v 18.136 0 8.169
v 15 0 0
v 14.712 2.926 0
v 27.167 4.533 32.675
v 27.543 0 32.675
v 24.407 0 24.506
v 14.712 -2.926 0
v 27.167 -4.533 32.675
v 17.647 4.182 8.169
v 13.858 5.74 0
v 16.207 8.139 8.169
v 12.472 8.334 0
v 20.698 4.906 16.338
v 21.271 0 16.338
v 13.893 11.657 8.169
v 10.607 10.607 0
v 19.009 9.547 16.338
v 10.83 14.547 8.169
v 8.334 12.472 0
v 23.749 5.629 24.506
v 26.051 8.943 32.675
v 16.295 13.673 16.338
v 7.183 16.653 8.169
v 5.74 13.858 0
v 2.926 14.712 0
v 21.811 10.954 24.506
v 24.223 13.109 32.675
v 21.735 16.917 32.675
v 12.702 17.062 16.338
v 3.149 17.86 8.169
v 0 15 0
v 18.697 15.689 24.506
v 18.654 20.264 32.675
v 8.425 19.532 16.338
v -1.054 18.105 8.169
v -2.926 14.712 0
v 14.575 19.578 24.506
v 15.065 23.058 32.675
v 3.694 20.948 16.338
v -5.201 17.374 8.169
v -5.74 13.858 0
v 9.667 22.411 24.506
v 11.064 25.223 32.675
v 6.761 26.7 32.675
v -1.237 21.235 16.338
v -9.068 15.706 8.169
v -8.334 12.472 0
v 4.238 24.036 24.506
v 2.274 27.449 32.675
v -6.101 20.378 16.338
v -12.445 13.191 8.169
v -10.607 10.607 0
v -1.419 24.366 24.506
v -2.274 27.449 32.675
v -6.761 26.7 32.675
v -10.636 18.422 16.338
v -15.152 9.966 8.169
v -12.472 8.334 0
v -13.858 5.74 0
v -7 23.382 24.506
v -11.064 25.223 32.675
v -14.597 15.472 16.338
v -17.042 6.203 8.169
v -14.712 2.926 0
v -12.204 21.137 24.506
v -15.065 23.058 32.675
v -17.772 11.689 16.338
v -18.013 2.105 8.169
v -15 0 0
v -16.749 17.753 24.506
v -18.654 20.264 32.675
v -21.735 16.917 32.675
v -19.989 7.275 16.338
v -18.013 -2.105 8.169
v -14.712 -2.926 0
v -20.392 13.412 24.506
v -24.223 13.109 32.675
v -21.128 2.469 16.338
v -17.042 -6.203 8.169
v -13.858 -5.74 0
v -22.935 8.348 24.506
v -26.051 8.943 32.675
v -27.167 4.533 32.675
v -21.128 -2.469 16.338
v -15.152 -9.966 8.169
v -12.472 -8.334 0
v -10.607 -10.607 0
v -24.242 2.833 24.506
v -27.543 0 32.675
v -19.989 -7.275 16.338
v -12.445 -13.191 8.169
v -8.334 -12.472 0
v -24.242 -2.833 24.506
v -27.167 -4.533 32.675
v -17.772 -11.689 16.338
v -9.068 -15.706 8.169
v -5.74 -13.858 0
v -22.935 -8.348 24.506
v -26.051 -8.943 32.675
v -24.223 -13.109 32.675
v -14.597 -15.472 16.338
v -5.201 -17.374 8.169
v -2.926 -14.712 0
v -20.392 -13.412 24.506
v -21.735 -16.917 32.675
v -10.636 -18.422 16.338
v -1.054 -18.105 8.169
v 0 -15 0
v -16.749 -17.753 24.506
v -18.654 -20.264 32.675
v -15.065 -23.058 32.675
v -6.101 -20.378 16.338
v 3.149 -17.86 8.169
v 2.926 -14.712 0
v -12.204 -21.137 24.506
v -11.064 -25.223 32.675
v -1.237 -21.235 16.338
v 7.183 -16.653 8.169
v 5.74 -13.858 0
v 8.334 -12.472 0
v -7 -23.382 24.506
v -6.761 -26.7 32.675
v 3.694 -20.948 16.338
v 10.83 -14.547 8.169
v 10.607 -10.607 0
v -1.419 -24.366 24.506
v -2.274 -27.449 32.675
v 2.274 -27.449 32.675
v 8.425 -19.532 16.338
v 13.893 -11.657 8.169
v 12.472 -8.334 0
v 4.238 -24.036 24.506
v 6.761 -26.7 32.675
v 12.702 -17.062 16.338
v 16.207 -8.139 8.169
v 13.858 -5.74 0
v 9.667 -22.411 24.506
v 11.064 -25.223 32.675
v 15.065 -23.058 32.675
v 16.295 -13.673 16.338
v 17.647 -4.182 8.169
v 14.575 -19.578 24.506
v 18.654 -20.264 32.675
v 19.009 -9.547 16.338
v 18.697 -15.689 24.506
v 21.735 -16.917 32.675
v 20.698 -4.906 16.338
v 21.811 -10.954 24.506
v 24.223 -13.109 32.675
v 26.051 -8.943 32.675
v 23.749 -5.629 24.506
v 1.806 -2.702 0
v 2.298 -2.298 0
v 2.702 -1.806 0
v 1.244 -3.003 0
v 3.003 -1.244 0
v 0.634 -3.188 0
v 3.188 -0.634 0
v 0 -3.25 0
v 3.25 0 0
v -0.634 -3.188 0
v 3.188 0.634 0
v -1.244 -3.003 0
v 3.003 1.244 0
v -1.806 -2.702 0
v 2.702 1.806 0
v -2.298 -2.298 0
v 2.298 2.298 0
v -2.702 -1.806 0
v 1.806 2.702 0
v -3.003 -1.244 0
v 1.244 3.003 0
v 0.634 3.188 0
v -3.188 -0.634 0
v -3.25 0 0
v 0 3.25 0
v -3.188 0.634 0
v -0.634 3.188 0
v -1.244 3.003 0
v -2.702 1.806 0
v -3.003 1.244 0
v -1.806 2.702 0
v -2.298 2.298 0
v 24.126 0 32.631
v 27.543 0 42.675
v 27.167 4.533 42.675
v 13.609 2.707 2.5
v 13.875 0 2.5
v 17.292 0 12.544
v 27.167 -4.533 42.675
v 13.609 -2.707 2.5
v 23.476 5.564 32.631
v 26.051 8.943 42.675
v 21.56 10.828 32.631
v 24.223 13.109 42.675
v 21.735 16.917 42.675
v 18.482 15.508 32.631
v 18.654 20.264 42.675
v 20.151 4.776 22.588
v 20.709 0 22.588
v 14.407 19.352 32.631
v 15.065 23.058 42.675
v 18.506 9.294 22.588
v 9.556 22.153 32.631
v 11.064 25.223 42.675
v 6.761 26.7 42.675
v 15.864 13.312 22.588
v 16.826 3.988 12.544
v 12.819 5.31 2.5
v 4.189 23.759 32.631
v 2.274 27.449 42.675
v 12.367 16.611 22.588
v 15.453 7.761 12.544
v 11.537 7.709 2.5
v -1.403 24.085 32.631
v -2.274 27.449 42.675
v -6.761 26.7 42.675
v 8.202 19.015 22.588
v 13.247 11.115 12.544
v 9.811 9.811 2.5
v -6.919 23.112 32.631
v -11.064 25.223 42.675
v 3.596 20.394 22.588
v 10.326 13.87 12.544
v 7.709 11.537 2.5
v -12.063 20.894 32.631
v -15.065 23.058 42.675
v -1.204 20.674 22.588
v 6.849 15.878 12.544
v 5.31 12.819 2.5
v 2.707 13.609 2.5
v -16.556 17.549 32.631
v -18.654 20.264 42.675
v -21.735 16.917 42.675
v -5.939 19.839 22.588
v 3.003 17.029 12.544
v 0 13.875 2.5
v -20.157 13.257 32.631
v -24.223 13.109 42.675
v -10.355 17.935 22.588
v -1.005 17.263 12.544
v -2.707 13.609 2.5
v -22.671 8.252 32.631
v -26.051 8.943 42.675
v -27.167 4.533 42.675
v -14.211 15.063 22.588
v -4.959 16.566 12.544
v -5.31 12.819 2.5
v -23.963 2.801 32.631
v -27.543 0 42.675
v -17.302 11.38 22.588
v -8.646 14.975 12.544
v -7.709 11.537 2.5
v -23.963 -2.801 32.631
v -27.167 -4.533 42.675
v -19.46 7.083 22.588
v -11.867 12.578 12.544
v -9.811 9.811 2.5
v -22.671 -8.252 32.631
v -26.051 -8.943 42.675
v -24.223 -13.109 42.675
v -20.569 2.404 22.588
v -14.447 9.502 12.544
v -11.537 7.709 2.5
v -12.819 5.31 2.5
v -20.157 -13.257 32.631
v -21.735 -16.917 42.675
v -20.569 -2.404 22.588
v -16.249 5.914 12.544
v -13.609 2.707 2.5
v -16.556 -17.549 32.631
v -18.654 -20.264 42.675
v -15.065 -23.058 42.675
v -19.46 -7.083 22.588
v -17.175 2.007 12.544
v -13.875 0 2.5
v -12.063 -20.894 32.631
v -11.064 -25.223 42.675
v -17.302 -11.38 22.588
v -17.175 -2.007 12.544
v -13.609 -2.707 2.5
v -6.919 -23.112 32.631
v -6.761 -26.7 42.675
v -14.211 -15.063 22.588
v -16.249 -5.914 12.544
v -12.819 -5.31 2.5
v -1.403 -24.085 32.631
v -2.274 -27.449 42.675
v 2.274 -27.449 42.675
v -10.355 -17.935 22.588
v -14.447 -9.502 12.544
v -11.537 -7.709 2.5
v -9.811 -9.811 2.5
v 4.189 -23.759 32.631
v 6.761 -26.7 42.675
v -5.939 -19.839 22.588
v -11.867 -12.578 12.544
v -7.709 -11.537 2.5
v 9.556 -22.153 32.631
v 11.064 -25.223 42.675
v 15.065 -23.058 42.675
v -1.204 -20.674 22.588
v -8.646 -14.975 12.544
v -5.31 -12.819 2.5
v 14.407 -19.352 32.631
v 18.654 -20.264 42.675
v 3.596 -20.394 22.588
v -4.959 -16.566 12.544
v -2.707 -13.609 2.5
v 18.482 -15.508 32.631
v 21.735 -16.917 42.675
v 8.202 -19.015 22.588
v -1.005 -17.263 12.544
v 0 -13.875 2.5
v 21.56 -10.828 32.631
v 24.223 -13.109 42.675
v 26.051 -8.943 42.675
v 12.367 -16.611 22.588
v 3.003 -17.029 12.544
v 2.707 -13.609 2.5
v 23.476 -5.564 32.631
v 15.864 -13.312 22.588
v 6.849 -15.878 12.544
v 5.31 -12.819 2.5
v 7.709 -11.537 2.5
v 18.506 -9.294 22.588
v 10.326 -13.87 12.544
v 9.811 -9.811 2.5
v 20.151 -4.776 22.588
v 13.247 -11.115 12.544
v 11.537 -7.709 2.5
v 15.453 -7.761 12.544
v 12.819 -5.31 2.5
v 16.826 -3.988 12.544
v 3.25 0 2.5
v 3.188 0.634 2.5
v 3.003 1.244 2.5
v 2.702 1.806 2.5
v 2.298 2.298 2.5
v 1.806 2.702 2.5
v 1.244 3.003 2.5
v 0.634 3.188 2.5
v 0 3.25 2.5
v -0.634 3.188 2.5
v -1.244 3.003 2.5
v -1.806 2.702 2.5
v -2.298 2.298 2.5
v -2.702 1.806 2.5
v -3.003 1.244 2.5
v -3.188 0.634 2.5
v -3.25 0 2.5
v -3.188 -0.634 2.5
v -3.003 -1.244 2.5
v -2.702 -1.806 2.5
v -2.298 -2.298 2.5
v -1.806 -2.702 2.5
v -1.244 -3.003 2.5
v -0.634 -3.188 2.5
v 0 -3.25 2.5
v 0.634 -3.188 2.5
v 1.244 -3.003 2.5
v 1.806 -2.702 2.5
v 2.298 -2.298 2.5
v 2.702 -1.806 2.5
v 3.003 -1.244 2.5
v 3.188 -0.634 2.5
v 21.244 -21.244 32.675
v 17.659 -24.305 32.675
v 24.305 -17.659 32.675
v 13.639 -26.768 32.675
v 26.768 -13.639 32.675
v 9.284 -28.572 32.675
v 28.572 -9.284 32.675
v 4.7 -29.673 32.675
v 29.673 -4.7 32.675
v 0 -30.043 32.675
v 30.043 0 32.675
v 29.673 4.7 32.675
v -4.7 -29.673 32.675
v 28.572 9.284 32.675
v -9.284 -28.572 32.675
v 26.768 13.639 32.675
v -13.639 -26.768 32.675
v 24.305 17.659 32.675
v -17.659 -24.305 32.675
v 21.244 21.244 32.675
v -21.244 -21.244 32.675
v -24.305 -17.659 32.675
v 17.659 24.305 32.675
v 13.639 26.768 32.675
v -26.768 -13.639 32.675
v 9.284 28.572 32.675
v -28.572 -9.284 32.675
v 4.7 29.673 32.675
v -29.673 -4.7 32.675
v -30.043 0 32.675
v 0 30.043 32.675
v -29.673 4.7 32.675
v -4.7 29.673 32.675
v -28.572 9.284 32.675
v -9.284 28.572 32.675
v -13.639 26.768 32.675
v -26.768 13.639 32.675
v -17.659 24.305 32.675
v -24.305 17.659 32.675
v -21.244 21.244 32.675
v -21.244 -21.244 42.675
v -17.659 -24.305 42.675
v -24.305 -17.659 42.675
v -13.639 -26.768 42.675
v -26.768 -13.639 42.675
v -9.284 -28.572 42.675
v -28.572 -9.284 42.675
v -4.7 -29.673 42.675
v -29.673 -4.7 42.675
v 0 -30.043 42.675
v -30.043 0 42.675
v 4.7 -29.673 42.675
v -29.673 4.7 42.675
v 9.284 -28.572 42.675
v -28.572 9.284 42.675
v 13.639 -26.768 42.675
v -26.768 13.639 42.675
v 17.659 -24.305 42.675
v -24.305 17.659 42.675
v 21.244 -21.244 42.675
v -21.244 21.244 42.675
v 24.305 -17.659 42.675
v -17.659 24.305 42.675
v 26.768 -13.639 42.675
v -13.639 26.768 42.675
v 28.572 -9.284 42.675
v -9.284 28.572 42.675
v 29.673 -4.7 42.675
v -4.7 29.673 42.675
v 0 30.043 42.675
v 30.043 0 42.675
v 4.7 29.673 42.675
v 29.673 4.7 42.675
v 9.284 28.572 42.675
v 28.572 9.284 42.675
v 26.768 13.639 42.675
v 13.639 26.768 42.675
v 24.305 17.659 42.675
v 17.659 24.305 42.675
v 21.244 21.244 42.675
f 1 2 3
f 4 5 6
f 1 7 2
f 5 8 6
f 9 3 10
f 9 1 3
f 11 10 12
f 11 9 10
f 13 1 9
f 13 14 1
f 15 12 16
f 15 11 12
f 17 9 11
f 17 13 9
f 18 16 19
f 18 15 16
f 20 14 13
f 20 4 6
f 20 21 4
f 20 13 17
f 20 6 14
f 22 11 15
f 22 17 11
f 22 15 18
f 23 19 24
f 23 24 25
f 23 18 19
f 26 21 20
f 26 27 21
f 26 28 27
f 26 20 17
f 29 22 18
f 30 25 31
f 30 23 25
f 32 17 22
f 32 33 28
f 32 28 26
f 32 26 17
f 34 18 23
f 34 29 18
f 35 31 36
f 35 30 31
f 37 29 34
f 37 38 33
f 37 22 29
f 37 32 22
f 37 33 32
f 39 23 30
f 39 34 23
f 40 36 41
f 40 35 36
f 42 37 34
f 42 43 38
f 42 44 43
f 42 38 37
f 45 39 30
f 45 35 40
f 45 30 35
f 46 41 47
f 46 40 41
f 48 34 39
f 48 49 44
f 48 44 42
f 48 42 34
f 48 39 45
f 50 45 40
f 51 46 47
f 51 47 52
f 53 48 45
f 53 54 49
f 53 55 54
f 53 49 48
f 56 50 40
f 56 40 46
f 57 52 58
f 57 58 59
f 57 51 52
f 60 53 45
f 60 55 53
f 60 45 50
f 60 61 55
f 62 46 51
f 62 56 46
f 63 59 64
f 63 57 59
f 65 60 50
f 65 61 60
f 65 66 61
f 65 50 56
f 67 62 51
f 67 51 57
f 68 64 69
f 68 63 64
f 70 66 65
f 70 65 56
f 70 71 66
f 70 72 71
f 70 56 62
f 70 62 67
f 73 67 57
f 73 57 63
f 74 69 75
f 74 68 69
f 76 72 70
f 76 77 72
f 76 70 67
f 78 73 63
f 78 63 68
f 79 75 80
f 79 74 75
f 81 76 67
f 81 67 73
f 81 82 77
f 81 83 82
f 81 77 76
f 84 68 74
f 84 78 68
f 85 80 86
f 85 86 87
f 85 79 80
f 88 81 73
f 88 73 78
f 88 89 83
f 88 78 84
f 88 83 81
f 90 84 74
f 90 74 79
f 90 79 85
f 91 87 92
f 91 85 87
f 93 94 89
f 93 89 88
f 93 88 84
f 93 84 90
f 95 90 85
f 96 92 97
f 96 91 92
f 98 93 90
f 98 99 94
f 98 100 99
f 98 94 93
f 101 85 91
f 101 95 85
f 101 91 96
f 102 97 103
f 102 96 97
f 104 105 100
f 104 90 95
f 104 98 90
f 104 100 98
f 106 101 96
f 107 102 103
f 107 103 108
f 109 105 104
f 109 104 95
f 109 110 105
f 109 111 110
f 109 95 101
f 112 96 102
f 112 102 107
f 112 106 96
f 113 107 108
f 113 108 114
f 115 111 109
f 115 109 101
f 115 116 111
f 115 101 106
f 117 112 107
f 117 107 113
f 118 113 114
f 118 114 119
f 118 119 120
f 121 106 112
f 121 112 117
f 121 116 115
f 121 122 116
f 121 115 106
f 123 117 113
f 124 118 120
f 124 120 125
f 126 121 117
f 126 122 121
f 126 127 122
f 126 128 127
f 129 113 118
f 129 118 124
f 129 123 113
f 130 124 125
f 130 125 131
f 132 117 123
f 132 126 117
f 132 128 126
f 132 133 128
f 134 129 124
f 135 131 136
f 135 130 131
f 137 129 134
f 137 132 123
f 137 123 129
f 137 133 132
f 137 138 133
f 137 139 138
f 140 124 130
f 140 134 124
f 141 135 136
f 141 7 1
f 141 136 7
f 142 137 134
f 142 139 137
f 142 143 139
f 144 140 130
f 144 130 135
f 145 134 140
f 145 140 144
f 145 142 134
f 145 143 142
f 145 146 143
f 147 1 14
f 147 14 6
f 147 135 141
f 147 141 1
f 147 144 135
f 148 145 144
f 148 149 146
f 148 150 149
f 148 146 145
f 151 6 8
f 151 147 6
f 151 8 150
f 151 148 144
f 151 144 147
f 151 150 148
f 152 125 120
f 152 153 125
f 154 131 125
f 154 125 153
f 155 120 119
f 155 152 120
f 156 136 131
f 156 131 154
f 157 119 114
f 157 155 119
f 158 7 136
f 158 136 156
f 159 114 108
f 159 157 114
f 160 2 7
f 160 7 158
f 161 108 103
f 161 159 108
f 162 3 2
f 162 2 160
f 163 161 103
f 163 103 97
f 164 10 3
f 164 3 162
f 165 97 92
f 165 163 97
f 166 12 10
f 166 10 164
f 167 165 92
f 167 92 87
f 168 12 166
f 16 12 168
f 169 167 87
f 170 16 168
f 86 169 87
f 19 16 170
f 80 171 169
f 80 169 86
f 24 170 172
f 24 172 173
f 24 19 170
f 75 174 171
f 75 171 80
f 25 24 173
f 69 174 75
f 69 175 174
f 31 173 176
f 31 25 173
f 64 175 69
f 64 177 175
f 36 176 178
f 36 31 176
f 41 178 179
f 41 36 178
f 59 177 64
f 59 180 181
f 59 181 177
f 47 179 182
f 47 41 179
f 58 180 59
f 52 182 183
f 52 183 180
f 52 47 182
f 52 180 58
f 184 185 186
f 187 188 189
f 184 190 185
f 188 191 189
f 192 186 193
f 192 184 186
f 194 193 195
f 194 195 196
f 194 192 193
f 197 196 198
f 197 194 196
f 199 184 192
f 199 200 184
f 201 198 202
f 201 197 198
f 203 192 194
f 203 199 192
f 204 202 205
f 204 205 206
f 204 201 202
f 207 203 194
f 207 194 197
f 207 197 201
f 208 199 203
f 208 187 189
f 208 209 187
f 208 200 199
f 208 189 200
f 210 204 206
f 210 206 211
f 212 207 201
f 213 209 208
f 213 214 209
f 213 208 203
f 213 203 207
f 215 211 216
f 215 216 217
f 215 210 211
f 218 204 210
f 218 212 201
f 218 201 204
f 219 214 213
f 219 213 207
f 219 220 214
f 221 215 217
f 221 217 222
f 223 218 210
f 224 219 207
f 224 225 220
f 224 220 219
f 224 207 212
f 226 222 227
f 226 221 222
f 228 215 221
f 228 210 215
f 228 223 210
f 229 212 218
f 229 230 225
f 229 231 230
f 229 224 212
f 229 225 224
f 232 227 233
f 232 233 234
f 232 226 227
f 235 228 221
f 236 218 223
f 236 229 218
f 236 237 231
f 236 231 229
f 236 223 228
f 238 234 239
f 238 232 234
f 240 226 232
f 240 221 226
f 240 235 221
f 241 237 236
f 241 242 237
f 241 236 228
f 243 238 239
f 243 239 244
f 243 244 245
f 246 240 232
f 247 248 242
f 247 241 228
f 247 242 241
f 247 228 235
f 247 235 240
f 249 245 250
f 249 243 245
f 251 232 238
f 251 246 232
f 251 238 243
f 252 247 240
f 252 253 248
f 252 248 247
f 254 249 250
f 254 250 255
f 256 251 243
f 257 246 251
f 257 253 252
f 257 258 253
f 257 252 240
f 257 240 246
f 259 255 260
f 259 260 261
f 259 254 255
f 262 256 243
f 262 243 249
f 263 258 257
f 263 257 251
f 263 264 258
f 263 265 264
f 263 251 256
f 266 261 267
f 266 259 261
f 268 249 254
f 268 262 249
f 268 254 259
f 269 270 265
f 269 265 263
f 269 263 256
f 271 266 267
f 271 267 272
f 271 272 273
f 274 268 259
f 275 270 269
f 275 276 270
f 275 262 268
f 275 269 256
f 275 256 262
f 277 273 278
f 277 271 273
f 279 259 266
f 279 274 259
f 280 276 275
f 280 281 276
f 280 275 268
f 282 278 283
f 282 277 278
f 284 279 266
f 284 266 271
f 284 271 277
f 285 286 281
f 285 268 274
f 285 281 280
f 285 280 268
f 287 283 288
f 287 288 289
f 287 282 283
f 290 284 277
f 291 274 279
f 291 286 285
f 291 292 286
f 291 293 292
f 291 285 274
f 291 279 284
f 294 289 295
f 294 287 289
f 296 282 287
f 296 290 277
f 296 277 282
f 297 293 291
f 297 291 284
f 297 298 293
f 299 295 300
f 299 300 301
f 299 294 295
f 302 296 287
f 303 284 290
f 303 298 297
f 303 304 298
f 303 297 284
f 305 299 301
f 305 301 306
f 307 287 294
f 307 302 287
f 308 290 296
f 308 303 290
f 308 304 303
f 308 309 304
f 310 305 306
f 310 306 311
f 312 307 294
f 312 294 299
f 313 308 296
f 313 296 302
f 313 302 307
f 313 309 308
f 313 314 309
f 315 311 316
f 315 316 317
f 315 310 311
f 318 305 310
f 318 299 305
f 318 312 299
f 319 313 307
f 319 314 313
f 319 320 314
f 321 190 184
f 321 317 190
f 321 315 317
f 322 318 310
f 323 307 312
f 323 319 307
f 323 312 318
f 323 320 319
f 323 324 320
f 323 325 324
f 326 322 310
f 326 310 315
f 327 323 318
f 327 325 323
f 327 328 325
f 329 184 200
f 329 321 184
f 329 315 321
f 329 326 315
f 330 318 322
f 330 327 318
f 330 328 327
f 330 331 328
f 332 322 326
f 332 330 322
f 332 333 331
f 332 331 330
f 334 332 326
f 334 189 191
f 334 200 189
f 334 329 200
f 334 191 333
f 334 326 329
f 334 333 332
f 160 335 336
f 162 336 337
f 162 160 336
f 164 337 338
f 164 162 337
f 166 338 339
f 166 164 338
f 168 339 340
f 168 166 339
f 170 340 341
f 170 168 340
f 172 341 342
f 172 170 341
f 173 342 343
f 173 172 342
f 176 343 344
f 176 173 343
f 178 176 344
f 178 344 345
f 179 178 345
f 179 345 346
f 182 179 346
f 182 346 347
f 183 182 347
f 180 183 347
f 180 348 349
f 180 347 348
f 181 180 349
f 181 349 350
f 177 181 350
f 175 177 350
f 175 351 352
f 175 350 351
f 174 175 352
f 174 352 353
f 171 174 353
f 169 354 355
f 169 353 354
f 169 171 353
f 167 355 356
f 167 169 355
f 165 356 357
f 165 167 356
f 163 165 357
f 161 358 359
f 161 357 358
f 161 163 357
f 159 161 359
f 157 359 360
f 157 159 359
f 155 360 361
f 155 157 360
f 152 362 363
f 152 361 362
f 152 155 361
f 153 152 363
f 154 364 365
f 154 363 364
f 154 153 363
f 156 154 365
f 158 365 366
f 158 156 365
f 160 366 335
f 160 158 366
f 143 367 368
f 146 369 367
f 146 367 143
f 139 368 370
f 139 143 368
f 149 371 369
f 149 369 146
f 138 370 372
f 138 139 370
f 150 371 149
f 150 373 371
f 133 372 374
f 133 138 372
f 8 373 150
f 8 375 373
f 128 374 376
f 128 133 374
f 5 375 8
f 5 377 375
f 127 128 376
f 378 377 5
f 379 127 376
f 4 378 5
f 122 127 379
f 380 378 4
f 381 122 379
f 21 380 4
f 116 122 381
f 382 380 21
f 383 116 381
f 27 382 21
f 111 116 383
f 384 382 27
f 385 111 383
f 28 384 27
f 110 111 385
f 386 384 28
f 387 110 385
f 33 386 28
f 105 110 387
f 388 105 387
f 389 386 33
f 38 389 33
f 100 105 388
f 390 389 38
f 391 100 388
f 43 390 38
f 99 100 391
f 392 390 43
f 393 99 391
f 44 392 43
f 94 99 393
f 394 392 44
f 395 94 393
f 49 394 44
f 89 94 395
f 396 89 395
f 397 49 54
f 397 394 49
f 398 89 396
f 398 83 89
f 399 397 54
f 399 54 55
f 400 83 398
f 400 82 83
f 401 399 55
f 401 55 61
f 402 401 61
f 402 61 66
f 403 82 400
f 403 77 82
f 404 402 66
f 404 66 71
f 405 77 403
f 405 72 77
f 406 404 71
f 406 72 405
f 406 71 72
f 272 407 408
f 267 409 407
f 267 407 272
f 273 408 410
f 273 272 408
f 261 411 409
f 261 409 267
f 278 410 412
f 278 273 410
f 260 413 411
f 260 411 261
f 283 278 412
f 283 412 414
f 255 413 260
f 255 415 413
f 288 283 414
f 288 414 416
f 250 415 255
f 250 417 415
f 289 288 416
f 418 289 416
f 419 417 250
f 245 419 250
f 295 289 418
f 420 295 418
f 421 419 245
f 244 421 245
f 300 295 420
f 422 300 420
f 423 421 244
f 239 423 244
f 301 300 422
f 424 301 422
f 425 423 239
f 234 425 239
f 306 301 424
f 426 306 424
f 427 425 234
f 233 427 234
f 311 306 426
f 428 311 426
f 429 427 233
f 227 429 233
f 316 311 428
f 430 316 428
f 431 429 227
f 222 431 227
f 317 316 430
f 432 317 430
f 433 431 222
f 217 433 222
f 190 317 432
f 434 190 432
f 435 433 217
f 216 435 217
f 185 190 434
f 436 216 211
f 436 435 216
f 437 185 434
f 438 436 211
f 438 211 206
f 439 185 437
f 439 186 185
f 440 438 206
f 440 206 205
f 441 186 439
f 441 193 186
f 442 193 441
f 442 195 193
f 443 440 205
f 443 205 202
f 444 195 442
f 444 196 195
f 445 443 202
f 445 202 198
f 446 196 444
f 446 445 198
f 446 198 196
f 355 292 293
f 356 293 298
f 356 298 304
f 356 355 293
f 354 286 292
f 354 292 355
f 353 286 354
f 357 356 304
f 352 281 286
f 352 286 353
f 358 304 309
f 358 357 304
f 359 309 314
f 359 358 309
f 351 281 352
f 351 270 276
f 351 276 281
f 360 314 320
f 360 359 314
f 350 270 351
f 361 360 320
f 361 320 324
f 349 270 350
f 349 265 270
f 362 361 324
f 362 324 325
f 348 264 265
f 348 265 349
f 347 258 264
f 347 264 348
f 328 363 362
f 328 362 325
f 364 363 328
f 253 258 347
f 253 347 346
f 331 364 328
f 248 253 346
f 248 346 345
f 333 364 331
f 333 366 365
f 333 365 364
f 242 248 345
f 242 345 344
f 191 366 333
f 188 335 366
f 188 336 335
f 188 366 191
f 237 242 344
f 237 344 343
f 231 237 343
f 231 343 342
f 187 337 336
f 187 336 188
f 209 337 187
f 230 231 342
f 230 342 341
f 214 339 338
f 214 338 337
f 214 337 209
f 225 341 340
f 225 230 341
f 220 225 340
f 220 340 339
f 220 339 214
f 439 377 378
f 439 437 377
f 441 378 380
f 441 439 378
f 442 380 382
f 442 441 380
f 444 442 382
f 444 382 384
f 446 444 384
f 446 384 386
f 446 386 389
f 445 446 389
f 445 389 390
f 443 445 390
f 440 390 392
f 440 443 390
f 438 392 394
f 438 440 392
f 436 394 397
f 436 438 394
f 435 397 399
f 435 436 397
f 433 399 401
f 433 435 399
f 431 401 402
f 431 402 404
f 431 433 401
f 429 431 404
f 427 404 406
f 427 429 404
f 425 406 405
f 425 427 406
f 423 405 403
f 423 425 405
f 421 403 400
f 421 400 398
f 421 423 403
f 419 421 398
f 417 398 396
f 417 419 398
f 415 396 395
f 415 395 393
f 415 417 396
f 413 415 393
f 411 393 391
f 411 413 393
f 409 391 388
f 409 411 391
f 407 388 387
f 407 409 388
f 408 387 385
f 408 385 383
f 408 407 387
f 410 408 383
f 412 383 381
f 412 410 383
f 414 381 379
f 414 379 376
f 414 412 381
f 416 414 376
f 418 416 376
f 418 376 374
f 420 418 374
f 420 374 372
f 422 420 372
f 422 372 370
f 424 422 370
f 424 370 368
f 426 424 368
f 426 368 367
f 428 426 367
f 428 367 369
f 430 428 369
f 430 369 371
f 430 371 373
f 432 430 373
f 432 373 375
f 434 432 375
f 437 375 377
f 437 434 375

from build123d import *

# Parameters (mm, degrees)
F2_R     = 3.25
F3_DEPTH = 42.676315


with BuildPart() as f1:
    # F0 (on Front) → F1 (revolve)
    with BuildSketch(Plane.XZ):
        Polygon((0, 2.5), (0, 0), (1.629259, 0), (15, 0), (27.542878, 32.675315), (30.042878, 32.675315), (30.042878, 42.675315), (27.542878, 42.675315), (13.875246, 2.5), (1.629259, 2.5), align=None)
    revolve(axis=Axis((0, 0, 21.337657), (0, 0, 1)))

    # F2 (on Top) → F3 (cut, through all)
    with BuildSketch(Plane.XY):
        Circle(F2_R)
    extrude(amount=F3_DEPTH, mode=Mode.SUBTRACT)


solid = f1.part
